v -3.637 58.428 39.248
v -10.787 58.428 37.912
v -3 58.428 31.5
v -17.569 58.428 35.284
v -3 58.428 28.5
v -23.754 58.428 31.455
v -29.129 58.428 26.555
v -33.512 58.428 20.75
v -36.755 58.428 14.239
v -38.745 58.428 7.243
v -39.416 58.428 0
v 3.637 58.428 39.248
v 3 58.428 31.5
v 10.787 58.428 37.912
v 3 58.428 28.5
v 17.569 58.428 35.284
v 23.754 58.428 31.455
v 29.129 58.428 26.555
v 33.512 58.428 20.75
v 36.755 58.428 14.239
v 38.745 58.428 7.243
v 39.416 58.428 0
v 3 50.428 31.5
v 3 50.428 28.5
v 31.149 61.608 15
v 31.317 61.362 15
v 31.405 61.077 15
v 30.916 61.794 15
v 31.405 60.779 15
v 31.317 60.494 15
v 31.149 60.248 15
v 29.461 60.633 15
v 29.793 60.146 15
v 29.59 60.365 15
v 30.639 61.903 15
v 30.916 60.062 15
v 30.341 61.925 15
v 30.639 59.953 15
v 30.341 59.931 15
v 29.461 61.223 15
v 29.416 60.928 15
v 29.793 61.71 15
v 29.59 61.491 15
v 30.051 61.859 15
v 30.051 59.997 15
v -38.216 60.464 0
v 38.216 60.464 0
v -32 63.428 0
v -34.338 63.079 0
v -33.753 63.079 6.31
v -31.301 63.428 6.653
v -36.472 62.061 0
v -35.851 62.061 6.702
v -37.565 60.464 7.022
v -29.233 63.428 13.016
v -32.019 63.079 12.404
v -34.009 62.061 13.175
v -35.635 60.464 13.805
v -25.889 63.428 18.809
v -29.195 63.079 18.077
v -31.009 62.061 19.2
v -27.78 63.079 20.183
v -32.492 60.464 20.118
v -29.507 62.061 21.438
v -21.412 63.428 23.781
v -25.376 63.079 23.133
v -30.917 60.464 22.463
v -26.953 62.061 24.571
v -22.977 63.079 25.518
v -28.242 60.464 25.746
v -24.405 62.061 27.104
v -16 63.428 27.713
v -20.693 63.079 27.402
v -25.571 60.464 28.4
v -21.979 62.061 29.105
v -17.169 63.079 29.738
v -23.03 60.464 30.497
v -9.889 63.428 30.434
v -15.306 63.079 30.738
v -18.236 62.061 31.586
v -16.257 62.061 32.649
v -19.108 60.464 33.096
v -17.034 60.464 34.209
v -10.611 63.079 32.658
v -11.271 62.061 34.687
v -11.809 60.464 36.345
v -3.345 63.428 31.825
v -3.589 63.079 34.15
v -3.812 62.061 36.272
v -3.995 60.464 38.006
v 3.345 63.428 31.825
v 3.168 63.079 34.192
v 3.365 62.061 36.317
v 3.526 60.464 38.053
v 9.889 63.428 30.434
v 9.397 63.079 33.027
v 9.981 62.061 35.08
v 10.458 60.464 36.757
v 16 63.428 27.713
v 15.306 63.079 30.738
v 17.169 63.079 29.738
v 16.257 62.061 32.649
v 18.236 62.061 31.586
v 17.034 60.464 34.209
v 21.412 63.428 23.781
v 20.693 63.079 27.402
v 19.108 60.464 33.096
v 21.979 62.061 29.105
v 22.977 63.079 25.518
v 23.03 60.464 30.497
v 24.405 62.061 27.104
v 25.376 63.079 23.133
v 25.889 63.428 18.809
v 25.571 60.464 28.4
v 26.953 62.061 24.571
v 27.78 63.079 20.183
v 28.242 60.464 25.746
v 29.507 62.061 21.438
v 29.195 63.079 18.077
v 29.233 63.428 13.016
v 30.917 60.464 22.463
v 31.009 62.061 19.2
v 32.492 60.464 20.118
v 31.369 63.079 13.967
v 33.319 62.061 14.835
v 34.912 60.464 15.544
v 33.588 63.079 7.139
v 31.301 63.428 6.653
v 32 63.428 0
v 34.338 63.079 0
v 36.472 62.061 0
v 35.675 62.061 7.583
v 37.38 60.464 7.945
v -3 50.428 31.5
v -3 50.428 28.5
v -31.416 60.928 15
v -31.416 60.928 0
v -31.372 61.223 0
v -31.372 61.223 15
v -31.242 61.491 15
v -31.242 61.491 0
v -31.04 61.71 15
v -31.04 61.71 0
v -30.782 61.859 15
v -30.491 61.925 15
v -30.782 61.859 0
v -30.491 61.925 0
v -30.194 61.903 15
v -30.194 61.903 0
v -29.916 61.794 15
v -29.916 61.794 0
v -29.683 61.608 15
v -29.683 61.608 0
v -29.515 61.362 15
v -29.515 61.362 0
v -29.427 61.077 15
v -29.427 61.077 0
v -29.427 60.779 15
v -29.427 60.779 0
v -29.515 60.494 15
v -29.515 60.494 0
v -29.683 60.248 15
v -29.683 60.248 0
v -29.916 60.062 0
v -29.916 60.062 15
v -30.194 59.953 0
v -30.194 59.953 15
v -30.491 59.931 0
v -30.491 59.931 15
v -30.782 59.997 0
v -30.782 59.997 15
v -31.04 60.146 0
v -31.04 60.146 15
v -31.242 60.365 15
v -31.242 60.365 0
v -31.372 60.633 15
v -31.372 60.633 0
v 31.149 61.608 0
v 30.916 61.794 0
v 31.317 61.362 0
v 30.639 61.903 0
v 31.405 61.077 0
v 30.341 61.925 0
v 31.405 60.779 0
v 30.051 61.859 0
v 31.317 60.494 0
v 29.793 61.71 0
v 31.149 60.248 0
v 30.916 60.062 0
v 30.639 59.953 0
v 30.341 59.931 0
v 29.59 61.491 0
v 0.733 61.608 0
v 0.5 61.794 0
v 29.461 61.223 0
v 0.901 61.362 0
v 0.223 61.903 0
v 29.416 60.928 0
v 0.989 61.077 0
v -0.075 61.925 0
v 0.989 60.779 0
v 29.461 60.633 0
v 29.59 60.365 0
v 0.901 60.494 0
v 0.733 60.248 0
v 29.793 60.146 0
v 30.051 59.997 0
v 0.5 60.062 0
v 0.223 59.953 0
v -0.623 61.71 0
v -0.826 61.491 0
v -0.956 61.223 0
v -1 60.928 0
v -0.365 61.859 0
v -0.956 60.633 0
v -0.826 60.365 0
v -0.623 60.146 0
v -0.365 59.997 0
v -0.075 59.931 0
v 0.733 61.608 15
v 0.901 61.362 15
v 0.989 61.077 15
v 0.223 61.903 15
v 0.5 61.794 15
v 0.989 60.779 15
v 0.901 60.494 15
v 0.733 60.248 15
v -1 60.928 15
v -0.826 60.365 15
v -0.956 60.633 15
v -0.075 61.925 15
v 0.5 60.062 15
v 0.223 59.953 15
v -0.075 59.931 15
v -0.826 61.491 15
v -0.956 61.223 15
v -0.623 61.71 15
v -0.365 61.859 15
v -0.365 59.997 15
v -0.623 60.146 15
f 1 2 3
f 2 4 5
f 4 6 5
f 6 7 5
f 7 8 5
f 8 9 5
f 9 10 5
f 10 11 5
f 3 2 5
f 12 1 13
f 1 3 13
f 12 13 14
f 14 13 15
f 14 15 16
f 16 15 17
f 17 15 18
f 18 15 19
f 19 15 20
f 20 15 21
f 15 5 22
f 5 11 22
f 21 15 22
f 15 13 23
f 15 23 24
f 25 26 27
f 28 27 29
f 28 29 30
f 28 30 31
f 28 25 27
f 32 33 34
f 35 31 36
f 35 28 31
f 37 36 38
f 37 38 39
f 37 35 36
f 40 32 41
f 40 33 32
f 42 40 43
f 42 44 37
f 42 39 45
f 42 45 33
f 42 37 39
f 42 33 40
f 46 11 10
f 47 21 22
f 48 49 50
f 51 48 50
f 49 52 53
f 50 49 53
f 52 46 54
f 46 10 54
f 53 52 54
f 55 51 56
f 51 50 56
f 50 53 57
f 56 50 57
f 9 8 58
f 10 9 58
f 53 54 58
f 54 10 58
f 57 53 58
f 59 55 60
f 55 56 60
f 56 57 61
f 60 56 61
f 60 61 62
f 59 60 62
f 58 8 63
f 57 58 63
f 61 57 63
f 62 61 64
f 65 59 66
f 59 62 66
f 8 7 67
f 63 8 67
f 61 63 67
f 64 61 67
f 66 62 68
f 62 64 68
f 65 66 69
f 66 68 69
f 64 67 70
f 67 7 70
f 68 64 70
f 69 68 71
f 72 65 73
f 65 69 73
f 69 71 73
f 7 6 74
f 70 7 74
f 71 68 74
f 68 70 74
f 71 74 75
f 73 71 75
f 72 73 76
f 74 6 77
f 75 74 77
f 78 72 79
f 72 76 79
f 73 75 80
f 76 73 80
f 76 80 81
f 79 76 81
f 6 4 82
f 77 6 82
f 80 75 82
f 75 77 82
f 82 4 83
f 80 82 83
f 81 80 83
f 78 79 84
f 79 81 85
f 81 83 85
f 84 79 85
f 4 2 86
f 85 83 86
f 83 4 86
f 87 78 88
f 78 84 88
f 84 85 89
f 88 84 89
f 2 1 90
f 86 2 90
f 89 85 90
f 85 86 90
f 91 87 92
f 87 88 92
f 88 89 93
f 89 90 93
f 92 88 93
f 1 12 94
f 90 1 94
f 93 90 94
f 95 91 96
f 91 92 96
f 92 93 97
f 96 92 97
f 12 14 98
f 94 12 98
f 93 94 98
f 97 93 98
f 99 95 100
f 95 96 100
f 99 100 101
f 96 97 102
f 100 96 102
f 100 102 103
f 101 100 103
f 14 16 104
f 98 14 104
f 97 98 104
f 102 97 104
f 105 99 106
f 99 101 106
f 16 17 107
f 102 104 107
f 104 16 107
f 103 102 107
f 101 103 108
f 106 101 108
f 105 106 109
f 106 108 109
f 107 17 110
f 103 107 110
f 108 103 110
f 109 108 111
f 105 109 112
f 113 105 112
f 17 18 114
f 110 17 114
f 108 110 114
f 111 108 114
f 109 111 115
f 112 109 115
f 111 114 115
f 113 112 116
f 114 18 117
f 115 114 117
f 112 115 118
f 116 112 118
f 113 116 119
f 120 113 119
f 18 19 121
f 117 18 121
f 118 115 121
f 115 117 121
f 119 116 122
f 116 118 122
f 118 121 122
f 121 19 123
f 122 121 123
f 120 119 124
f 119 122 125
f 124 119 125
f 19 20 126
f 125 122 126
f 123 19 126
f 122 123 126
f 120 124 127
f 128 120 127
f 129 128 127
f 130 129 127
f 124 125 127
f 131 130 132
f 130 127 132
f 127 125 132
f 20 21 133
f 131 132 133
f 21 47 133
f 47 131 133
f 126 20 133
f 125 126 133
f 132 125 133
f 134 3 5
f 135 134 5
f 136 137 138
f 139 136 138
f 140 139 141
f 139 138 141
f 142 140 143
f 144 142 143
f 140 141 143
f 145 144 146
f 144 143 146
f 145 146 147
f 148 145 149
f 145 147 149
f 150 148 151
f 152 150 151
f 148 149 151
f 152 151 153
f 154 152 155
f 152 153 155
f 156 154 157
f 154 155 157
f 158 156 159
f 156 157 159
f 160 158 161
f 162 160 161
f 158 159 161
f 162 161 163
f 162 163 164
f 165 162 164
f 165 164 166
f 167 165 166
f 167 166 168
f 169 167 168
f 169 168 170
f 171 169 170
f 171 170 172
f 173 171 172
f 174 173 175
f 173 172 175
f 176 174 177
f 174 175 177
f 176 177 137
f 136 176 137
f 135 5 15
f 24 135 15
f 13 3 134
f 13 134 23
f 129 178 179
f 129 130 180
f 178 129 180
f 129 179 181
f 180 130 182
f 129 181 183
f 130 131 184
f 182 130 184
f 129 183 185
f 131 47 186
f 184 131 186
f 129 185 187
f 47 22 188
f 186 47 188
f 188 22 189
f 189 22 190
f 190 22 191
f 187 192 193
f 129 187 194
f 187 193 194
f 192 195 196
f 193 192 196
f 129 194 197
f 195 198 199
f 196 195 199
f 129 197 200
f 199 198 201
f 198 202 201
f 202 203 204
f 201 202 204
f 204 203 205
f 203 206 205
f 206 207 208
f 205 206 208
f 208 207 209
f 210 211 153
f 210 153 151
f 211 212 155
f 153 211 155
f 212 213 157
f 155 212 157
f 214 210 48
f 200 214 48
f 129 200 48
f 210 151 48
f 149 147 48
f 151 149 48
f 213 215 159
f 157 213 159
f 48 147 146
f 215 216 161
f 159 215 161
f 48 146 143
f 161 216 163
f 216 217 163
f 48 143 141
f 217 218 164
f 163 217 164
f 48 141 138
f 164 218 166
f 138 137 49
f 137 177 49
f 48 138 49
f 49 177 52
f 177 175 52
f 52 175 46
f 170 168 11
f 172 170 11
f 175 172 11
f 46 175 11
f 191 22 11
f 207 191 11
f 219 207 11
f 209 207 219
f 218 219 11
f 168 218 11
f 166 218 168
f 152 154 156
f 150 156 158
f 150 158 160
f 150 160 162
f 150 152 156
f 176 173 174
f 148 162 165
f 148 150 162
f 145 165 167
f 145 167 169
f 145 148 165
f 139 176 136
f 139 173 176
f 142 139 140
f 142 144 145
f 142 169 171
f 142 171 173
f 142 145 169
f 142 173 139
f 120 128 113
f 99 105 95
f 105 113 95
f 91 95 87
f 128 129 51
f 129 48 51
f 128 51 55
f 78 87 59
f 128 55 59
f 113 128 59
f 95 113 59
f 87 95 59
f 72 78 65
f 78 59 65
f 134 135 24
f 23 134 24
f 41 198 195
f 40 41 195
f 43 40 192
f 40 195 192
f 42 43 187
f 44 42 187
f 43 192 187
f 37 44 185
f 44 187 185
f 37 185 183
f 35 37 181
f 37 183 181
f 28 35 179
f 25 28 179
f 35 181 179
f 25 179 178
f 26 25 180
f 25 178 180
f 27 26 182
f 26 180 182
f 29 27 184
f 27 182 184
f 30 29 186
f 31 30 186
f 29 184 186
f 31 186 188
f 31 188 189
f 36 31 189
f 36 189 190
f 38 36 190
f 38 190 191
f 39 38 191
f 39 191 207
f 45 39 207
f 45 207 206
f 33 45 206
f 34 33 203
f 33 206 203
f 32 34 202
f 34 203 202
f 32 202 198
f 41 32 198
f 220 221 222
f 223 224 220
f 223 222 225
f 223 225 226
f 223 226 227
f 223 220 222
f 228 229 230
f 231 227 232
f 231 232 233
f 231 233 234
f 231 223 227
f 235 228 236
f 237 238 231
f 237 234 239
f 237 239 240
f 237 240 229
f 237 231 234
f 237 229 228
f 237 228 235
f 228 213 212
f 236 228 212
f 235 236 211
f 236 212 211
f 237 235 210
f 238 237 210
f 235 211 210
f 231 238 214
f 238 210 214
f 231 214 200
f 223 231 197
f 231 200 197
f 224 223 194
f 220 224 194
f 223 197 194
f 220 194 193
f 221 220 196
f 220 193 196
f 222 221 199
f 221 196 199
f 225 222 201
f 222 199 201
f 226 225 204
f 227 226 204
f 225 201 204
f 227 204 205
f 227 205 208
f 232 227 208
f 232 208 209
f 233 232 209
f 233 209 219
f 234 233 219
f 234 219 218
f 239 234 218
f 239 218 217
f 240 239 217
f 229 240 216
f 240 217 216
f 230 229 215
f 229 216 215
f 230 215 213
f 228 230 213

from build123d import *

# Parameters (mm, degrees)
CUT_EXTRUDE3_DEPTH           = 60
CUT_EXTRUDE5_DEPTH           = 2
CUT_EXTRUDE5_DEPTH_BACK      = 30
SKETCH9_R                    = 38
SKETCH9_R_2                  = 23
SKETCH19_W                   = 12
SKETCH19_H                   = 36.5
CUT_REVOLVE2_ANGLE           = 65
CUT_REVOLVE2_OTHER_WAY_ANGLE = 65
SKETCH21_W                   = 3.25
SKETCH21_H                   = 4
BOSS_EXTRUDE3_DEPTH          = 1.35
CIRPATTERN1_COUNT            = 5
CUT_EXTRUDE9_START           = -5
CUT_EXTRUDE9_DEPTH           = 5
SKETCH23_R                   = 10.5
CUT_EXTRUDE10_DEPTH          = 10
SKETCH24_W                   = 15
SKETCH24_H                   = 8
BOSS_EXTRUDE4_DEPTH          = 8
SKETCH26_W                   = 10
SKETCH26_H                   = 6
CUT_EXTRUDE11_DEPTH          = 10
SKETCH27_W                   = 4
SKETCH27_H                   = 5
CUT_EXTRUDE12_DEPTH          = 5
CUT_EXTRUDE14_DEPTH          = 2
CUT_EXTRUDE14_DEPTH_BACK     = 30
SKETCH29_R                   = 1
CUT_EXTRUDE15_DEPTH          = 15
FILLET1_R                    = 6
FILLET2_R                    = 8
INTERSECT1_DEPTH             = 58.427876097
SKETCH31_W                   = 6
SKETCH31_H                   = 3
BOSS_EXTRUDE7_DEPTH          = 8


# Read off the part's stored shape, not the designer's step: Cut-Extrude9, Intersect1
with BuildPart() as part:
    # Sketch1 → Revolve1 (revolve)
    with BuildSketch(Plane.XY, mode=Mode.PRIVATE) as revolve1_sk:
        with BuildLine():
            Line((0, 63.427876097), (32, 63.427876097))
            ThreePointArc((32, 63.427876097), (37.656854249, 61.084730346), (40, 55.427876097))
            Line((40, 55.427876097), (40, 28.846818009))
            ThreePointArc((40, 28.846818009), (38.792081772, 24.082439968), (35.460140376, 20.469057744))
            Line((35.460140376, 20.469057744), (28.539859624, 15.958818353))
            ThreePointArc((28.539859624, 15.958818353), (25.207918228, 12.345436129), (24, 7.581058088))
            Line((24, 7.581058088), (24, 3.25))
            Line((24, 3.25), (24.35, 3))
            Line((24.35, 3), (24.35, 0))
            Line((24.35, 0), (22.5, 0))
            Line((22.5, 0), (22.5, 12.5))
            ThreePointArc((22.5, 12.5), (22.353553391, 12.853553391), (22, 13))
            Line((22, 13), (0, 13))
            Line((0, 13), (0, 63.427876097))
        make_face()
    revolve(revolve1_sk.sketch.rotate(Axis((0, 0, 0), (0, 1, 0)), 90), axis=Axis((0, 0, 0), (0, 1, 0)))

    # Sketch11 → Cut-Extrude3 (cut)
    with BuildSketch(Plane(origin=(0, 13, 0), x_dir=(-1, 0, 0), z_dir=(0, -1, 0))):
        with BuildLine():
            Line((-21, 0), (21, 0))
            ThreePointArc((21, 0), (0, 21), (-21, 0))
        make_face()
    extrude(amount=-CUT_EXTRUDE3_DEPTH, mode=Mode.SUBTRACT)

    # Sketch9 → Cut-Extrude5 (cut, two sides: drawn at the far end of the back side and taken through both)
    with BuildSketch(Plane(origin=(0, 55.427876097, 0), x_dir=(1, 0, 0), z_dir=(0, 1, 0)).offset(-CUT_EXTRUDE5_DEPTH_BACK)):
        with Locations(Location((0, 0, 0), (0, 0, 270))):
            Circle(SKETCH9_R)
        with Locations(Location((0, 0, 0), (0, 0, 270))):
            Circle(SKETCH9_R_2, mode=Mode.SUBTRACT)
    extrude(amount=CUT_EXTRUDE5_DEPTH + CUT_EXTRUDE5_DEPTH_BACK, mode=Mode.SUBTRACT)

    # Sketch19 → Cut-Revolve2 (revolve, cut)
    with BuildSketch(Plane(origin=(0, 0, 0), x_dir=(0, 0, -1), z_dir=(1, 0, 0))):
        with Locations((-41.064715832, 37.177876097)):
            Rectangle(SKETCH19_W, SKETCH19_H)
    revolve(axis=Axis((0, 0, 0), (0, 1, 0)), revolution_arc=CUT_REVOLVE2_ANGLE, mode=Mode.SUBTRACT)

    # Sketch19 → Cut-Revolve2 other way (revolve, cut)
    with BuildSketch(Plane(origin=(0, 0, 0), x_dir=(0, 0, -1), z_dir=(1, 0, 0))):
        with Locations((-41.064715832, 37.177876097)):
            Rectangle(SKETCH19_W, SKETCH19_H)
    revolve(axis=Axis((0, 0, 0), (0, -1, 0)), revolution_arc=CUT_REVOLVE2_OTHER_WAY_ANGLE, mode=Mode.SUBTRACT)

    # Sketch21 → Boss-Extrude3 (add)
    with BuildSketch(Plane(origin=(0, 0, 22.5), x_dir=(-1, 0, 0), z_dir=(0, 0, -1))):
        with Locations((0, 2)):
            Rectangle(SKETCH21_W, SKETCH21_H)
    boss_extrude3 = extrude(amount=BOSS_EXTRUDE3_DEPTH)

    # CirPattern1: Boss-Extrude3 ×5 about axis
    cirpattern1_axis = Axis((0, 0, 0), (0, 1, 0))
    for i in range(1, CIRPATTERN1_COUNT):
        add(boss_extrude3.rotate(cirpattern1_axis, i * 360 / CIRPATTERN1_COUNT))

    # Cut-Extrude9 outline → Cut-Extrude9 (cut)
    with BuildSketch(Plane(origin=(0, 63.427876097, 0), x_dir=(1, 0, 0), z_dir=(0, 1, 0)).offset(CUT_EXTRUDE9_START)):
        with BuildLine():
            ThreePointArc((40, 0), (0, 40), (-40, 0))
            Line((-40, 0), (-21, 0))
            ThreePointArc((-21, 0), (0, 21), (21, 0))
            Line((21, 0), (40, 0))
        make_face()
    extrude(amount=CUT_EXTRUDE9_DEPTH, mode=Mode.SUBTRACT)

    # Sketch23 → Cut-Extrude10 (cut)
    with BuildSketch(Plane(origin=(0, 0, -40), x_dir=(-1, 0, 0), z_dir=(0, 0, -1))):
        with Locations((0, 42.137876097)):
            Circle(SKETCH23_R)
    extrude(amount=-CUT_EXTRUDE10_DEPTH, mode=Mode.SUBTRACT)

    # Sketch24 → Boss-Extrude4 (add)
    with BuildSketch(Plane(origin=(0, 58.427876097, 0), x_dir=(1, 0, 0), z_dir=(0, 1, 0))):
        with Locations((0, 30)):
            Rectangle(SKETCH24_W, SKETCH24_H)
    extrude(amount=-BOSS_EXTRUDE4_DEPTH)

    # Sketch26 → Cut-Extrude11 (cut)
    with BuildSketch(Plane(origin=(0, 58.427876097, 0), x_dir=(1, 0, 0), z_dir=(0, 1, 0))):
        with Locations((0, 30)):
            Rectangle(SKETCH26_W, SKETCH26_H)
    extrude(amount=-CUT_EXTRUDE11_DEPTH, mode=Mode.SUBTRACT)

    # Sketch27 → Cut-Extrude12 (cut)
    with BuildSketch(Plane(origin=(7.5, 0, 0), x_dir=(0, 0, -1), z_dir=(1, 0, 0))):
        with Locations((30, 53.927876097)):
            Rectangle(SKETCH27_W, SKETCH27_H)
    extrude(amount=-CUT_EXTRUDE12_DEPTH, mode=Mode.SUBTRACT)

    # Sketch28 → Cut-Extrude14 (cut, two sides: drawn at the far end of the back side and taken through both)
    with BuildSketch(Plane(origin=(0, 55.427876097, 0), x_dir=(1, 0, 0), z_dir=(0, 1, 0)).offset(-CUT_EXTRUDE14_DEPTH_BACK)):
        with BuildLine():
            Line((-22.912878475, -2), (22.912878475, -2))
            ThreePointArc((22.912878475, -2), (0, -23), (-22.912878475, -2))
        make_face()
    extrude(amount=CUT_EXTRUDE14_DEPTH + CUT_EXTRUDE14_DEPTH_BACK, mode=Mode.SUBTRACT)

    # Sketch29 → Cut-Extrude15 (cut)
    with BuildSketch(Plane(origin=(0, 0, 0), x_dir=(-1, 0, 0), z_dir=(0, 0, -1))):
        with Locations((-30.416198487, 60.927876097)):
            Circle(SKETCH29_R)
        with Locations((30.416198487, 60.927876097)):
            Circle(SKETCH29_R)
        with Locations((0, 60.927876097)):
            Circle(SKETCH29_R)
    extrude(amount=-CUT_EXTRUDE15_DEPTH, mode=Mode.SUBTRACT)

    # Fillet1
    fillet1_edges = [part.edges().sort_by_distance(p)[0] for p in [
        (21, 35.713938048, 0),
        (-21, 35.713938048, 0),
    ]]
    fillet(fillet1_edges, radius=FILLET1_R)

    # Fillet2
    fillet2_edges = [part.edges().sort_by_distance(p)[0] for p in [
        (-22.912878475, 41.427876097, 2),
        (22.912878475, 41.427876097, 2),
    ]]
    fillet(fillet2_edges, radius=FILLET2_R)

    # Intersect1 outline → Intersect1 (cut)
    with BuildSketch(Plane(origin=(0, 0, 0), x_dir=(1, 0, 0), z_dir=(0, 1, 0))):
        with BuildLine():
            Line((-37.508702776, -13.895942431), (-42, -15.355253362))
            Line((-42, -15.355253362), (-42, -41))
            Line((-42, -41), (42, -41))
            Line((42, -41), (42, -15.355253362))
            Line((42, -15.355253362), (37.508702776, -13.895942431))
            ThreePointArc((37.508702776, -13.895942431), (0, 40), (-37.508702776, -13.895942431))
        make_face()
        with BuildLine():
            ThreePointArc((19.246817919, 8.4), (18.767687244, 2.713664655), (13.747727085, 0))
            Line((13.747727085, 0), (-13.747727085, 0))
            ThreePointArc((-13.747727085, 0), (-18.767687244, 2.713664655), (-19.246817919, 8.4))
            ThreePointArc((-19.246817919, 8.4), (0, 21), (19.246817919, 8.4))
        make_face(mode=Mode.SUBTRACT)
    extrude(amount=INTERSECT1_DEPTH, mode=Mode.SUBTRACT)

    # Sketch31 → Boss-Extrude7 (add)
    with BuildSketch(Plane(origin=(0, 58.427876097, 0), x_dir=(1, 0, 0), z_dir=(0, 1, 0))):
        with Locations((0, -30)):
            Rectangle(SKETCH31_W, SKETCH31_H)
    extrude(amount=-BOSS_EXTRUDE7_DEPTH)


solid = part.part
